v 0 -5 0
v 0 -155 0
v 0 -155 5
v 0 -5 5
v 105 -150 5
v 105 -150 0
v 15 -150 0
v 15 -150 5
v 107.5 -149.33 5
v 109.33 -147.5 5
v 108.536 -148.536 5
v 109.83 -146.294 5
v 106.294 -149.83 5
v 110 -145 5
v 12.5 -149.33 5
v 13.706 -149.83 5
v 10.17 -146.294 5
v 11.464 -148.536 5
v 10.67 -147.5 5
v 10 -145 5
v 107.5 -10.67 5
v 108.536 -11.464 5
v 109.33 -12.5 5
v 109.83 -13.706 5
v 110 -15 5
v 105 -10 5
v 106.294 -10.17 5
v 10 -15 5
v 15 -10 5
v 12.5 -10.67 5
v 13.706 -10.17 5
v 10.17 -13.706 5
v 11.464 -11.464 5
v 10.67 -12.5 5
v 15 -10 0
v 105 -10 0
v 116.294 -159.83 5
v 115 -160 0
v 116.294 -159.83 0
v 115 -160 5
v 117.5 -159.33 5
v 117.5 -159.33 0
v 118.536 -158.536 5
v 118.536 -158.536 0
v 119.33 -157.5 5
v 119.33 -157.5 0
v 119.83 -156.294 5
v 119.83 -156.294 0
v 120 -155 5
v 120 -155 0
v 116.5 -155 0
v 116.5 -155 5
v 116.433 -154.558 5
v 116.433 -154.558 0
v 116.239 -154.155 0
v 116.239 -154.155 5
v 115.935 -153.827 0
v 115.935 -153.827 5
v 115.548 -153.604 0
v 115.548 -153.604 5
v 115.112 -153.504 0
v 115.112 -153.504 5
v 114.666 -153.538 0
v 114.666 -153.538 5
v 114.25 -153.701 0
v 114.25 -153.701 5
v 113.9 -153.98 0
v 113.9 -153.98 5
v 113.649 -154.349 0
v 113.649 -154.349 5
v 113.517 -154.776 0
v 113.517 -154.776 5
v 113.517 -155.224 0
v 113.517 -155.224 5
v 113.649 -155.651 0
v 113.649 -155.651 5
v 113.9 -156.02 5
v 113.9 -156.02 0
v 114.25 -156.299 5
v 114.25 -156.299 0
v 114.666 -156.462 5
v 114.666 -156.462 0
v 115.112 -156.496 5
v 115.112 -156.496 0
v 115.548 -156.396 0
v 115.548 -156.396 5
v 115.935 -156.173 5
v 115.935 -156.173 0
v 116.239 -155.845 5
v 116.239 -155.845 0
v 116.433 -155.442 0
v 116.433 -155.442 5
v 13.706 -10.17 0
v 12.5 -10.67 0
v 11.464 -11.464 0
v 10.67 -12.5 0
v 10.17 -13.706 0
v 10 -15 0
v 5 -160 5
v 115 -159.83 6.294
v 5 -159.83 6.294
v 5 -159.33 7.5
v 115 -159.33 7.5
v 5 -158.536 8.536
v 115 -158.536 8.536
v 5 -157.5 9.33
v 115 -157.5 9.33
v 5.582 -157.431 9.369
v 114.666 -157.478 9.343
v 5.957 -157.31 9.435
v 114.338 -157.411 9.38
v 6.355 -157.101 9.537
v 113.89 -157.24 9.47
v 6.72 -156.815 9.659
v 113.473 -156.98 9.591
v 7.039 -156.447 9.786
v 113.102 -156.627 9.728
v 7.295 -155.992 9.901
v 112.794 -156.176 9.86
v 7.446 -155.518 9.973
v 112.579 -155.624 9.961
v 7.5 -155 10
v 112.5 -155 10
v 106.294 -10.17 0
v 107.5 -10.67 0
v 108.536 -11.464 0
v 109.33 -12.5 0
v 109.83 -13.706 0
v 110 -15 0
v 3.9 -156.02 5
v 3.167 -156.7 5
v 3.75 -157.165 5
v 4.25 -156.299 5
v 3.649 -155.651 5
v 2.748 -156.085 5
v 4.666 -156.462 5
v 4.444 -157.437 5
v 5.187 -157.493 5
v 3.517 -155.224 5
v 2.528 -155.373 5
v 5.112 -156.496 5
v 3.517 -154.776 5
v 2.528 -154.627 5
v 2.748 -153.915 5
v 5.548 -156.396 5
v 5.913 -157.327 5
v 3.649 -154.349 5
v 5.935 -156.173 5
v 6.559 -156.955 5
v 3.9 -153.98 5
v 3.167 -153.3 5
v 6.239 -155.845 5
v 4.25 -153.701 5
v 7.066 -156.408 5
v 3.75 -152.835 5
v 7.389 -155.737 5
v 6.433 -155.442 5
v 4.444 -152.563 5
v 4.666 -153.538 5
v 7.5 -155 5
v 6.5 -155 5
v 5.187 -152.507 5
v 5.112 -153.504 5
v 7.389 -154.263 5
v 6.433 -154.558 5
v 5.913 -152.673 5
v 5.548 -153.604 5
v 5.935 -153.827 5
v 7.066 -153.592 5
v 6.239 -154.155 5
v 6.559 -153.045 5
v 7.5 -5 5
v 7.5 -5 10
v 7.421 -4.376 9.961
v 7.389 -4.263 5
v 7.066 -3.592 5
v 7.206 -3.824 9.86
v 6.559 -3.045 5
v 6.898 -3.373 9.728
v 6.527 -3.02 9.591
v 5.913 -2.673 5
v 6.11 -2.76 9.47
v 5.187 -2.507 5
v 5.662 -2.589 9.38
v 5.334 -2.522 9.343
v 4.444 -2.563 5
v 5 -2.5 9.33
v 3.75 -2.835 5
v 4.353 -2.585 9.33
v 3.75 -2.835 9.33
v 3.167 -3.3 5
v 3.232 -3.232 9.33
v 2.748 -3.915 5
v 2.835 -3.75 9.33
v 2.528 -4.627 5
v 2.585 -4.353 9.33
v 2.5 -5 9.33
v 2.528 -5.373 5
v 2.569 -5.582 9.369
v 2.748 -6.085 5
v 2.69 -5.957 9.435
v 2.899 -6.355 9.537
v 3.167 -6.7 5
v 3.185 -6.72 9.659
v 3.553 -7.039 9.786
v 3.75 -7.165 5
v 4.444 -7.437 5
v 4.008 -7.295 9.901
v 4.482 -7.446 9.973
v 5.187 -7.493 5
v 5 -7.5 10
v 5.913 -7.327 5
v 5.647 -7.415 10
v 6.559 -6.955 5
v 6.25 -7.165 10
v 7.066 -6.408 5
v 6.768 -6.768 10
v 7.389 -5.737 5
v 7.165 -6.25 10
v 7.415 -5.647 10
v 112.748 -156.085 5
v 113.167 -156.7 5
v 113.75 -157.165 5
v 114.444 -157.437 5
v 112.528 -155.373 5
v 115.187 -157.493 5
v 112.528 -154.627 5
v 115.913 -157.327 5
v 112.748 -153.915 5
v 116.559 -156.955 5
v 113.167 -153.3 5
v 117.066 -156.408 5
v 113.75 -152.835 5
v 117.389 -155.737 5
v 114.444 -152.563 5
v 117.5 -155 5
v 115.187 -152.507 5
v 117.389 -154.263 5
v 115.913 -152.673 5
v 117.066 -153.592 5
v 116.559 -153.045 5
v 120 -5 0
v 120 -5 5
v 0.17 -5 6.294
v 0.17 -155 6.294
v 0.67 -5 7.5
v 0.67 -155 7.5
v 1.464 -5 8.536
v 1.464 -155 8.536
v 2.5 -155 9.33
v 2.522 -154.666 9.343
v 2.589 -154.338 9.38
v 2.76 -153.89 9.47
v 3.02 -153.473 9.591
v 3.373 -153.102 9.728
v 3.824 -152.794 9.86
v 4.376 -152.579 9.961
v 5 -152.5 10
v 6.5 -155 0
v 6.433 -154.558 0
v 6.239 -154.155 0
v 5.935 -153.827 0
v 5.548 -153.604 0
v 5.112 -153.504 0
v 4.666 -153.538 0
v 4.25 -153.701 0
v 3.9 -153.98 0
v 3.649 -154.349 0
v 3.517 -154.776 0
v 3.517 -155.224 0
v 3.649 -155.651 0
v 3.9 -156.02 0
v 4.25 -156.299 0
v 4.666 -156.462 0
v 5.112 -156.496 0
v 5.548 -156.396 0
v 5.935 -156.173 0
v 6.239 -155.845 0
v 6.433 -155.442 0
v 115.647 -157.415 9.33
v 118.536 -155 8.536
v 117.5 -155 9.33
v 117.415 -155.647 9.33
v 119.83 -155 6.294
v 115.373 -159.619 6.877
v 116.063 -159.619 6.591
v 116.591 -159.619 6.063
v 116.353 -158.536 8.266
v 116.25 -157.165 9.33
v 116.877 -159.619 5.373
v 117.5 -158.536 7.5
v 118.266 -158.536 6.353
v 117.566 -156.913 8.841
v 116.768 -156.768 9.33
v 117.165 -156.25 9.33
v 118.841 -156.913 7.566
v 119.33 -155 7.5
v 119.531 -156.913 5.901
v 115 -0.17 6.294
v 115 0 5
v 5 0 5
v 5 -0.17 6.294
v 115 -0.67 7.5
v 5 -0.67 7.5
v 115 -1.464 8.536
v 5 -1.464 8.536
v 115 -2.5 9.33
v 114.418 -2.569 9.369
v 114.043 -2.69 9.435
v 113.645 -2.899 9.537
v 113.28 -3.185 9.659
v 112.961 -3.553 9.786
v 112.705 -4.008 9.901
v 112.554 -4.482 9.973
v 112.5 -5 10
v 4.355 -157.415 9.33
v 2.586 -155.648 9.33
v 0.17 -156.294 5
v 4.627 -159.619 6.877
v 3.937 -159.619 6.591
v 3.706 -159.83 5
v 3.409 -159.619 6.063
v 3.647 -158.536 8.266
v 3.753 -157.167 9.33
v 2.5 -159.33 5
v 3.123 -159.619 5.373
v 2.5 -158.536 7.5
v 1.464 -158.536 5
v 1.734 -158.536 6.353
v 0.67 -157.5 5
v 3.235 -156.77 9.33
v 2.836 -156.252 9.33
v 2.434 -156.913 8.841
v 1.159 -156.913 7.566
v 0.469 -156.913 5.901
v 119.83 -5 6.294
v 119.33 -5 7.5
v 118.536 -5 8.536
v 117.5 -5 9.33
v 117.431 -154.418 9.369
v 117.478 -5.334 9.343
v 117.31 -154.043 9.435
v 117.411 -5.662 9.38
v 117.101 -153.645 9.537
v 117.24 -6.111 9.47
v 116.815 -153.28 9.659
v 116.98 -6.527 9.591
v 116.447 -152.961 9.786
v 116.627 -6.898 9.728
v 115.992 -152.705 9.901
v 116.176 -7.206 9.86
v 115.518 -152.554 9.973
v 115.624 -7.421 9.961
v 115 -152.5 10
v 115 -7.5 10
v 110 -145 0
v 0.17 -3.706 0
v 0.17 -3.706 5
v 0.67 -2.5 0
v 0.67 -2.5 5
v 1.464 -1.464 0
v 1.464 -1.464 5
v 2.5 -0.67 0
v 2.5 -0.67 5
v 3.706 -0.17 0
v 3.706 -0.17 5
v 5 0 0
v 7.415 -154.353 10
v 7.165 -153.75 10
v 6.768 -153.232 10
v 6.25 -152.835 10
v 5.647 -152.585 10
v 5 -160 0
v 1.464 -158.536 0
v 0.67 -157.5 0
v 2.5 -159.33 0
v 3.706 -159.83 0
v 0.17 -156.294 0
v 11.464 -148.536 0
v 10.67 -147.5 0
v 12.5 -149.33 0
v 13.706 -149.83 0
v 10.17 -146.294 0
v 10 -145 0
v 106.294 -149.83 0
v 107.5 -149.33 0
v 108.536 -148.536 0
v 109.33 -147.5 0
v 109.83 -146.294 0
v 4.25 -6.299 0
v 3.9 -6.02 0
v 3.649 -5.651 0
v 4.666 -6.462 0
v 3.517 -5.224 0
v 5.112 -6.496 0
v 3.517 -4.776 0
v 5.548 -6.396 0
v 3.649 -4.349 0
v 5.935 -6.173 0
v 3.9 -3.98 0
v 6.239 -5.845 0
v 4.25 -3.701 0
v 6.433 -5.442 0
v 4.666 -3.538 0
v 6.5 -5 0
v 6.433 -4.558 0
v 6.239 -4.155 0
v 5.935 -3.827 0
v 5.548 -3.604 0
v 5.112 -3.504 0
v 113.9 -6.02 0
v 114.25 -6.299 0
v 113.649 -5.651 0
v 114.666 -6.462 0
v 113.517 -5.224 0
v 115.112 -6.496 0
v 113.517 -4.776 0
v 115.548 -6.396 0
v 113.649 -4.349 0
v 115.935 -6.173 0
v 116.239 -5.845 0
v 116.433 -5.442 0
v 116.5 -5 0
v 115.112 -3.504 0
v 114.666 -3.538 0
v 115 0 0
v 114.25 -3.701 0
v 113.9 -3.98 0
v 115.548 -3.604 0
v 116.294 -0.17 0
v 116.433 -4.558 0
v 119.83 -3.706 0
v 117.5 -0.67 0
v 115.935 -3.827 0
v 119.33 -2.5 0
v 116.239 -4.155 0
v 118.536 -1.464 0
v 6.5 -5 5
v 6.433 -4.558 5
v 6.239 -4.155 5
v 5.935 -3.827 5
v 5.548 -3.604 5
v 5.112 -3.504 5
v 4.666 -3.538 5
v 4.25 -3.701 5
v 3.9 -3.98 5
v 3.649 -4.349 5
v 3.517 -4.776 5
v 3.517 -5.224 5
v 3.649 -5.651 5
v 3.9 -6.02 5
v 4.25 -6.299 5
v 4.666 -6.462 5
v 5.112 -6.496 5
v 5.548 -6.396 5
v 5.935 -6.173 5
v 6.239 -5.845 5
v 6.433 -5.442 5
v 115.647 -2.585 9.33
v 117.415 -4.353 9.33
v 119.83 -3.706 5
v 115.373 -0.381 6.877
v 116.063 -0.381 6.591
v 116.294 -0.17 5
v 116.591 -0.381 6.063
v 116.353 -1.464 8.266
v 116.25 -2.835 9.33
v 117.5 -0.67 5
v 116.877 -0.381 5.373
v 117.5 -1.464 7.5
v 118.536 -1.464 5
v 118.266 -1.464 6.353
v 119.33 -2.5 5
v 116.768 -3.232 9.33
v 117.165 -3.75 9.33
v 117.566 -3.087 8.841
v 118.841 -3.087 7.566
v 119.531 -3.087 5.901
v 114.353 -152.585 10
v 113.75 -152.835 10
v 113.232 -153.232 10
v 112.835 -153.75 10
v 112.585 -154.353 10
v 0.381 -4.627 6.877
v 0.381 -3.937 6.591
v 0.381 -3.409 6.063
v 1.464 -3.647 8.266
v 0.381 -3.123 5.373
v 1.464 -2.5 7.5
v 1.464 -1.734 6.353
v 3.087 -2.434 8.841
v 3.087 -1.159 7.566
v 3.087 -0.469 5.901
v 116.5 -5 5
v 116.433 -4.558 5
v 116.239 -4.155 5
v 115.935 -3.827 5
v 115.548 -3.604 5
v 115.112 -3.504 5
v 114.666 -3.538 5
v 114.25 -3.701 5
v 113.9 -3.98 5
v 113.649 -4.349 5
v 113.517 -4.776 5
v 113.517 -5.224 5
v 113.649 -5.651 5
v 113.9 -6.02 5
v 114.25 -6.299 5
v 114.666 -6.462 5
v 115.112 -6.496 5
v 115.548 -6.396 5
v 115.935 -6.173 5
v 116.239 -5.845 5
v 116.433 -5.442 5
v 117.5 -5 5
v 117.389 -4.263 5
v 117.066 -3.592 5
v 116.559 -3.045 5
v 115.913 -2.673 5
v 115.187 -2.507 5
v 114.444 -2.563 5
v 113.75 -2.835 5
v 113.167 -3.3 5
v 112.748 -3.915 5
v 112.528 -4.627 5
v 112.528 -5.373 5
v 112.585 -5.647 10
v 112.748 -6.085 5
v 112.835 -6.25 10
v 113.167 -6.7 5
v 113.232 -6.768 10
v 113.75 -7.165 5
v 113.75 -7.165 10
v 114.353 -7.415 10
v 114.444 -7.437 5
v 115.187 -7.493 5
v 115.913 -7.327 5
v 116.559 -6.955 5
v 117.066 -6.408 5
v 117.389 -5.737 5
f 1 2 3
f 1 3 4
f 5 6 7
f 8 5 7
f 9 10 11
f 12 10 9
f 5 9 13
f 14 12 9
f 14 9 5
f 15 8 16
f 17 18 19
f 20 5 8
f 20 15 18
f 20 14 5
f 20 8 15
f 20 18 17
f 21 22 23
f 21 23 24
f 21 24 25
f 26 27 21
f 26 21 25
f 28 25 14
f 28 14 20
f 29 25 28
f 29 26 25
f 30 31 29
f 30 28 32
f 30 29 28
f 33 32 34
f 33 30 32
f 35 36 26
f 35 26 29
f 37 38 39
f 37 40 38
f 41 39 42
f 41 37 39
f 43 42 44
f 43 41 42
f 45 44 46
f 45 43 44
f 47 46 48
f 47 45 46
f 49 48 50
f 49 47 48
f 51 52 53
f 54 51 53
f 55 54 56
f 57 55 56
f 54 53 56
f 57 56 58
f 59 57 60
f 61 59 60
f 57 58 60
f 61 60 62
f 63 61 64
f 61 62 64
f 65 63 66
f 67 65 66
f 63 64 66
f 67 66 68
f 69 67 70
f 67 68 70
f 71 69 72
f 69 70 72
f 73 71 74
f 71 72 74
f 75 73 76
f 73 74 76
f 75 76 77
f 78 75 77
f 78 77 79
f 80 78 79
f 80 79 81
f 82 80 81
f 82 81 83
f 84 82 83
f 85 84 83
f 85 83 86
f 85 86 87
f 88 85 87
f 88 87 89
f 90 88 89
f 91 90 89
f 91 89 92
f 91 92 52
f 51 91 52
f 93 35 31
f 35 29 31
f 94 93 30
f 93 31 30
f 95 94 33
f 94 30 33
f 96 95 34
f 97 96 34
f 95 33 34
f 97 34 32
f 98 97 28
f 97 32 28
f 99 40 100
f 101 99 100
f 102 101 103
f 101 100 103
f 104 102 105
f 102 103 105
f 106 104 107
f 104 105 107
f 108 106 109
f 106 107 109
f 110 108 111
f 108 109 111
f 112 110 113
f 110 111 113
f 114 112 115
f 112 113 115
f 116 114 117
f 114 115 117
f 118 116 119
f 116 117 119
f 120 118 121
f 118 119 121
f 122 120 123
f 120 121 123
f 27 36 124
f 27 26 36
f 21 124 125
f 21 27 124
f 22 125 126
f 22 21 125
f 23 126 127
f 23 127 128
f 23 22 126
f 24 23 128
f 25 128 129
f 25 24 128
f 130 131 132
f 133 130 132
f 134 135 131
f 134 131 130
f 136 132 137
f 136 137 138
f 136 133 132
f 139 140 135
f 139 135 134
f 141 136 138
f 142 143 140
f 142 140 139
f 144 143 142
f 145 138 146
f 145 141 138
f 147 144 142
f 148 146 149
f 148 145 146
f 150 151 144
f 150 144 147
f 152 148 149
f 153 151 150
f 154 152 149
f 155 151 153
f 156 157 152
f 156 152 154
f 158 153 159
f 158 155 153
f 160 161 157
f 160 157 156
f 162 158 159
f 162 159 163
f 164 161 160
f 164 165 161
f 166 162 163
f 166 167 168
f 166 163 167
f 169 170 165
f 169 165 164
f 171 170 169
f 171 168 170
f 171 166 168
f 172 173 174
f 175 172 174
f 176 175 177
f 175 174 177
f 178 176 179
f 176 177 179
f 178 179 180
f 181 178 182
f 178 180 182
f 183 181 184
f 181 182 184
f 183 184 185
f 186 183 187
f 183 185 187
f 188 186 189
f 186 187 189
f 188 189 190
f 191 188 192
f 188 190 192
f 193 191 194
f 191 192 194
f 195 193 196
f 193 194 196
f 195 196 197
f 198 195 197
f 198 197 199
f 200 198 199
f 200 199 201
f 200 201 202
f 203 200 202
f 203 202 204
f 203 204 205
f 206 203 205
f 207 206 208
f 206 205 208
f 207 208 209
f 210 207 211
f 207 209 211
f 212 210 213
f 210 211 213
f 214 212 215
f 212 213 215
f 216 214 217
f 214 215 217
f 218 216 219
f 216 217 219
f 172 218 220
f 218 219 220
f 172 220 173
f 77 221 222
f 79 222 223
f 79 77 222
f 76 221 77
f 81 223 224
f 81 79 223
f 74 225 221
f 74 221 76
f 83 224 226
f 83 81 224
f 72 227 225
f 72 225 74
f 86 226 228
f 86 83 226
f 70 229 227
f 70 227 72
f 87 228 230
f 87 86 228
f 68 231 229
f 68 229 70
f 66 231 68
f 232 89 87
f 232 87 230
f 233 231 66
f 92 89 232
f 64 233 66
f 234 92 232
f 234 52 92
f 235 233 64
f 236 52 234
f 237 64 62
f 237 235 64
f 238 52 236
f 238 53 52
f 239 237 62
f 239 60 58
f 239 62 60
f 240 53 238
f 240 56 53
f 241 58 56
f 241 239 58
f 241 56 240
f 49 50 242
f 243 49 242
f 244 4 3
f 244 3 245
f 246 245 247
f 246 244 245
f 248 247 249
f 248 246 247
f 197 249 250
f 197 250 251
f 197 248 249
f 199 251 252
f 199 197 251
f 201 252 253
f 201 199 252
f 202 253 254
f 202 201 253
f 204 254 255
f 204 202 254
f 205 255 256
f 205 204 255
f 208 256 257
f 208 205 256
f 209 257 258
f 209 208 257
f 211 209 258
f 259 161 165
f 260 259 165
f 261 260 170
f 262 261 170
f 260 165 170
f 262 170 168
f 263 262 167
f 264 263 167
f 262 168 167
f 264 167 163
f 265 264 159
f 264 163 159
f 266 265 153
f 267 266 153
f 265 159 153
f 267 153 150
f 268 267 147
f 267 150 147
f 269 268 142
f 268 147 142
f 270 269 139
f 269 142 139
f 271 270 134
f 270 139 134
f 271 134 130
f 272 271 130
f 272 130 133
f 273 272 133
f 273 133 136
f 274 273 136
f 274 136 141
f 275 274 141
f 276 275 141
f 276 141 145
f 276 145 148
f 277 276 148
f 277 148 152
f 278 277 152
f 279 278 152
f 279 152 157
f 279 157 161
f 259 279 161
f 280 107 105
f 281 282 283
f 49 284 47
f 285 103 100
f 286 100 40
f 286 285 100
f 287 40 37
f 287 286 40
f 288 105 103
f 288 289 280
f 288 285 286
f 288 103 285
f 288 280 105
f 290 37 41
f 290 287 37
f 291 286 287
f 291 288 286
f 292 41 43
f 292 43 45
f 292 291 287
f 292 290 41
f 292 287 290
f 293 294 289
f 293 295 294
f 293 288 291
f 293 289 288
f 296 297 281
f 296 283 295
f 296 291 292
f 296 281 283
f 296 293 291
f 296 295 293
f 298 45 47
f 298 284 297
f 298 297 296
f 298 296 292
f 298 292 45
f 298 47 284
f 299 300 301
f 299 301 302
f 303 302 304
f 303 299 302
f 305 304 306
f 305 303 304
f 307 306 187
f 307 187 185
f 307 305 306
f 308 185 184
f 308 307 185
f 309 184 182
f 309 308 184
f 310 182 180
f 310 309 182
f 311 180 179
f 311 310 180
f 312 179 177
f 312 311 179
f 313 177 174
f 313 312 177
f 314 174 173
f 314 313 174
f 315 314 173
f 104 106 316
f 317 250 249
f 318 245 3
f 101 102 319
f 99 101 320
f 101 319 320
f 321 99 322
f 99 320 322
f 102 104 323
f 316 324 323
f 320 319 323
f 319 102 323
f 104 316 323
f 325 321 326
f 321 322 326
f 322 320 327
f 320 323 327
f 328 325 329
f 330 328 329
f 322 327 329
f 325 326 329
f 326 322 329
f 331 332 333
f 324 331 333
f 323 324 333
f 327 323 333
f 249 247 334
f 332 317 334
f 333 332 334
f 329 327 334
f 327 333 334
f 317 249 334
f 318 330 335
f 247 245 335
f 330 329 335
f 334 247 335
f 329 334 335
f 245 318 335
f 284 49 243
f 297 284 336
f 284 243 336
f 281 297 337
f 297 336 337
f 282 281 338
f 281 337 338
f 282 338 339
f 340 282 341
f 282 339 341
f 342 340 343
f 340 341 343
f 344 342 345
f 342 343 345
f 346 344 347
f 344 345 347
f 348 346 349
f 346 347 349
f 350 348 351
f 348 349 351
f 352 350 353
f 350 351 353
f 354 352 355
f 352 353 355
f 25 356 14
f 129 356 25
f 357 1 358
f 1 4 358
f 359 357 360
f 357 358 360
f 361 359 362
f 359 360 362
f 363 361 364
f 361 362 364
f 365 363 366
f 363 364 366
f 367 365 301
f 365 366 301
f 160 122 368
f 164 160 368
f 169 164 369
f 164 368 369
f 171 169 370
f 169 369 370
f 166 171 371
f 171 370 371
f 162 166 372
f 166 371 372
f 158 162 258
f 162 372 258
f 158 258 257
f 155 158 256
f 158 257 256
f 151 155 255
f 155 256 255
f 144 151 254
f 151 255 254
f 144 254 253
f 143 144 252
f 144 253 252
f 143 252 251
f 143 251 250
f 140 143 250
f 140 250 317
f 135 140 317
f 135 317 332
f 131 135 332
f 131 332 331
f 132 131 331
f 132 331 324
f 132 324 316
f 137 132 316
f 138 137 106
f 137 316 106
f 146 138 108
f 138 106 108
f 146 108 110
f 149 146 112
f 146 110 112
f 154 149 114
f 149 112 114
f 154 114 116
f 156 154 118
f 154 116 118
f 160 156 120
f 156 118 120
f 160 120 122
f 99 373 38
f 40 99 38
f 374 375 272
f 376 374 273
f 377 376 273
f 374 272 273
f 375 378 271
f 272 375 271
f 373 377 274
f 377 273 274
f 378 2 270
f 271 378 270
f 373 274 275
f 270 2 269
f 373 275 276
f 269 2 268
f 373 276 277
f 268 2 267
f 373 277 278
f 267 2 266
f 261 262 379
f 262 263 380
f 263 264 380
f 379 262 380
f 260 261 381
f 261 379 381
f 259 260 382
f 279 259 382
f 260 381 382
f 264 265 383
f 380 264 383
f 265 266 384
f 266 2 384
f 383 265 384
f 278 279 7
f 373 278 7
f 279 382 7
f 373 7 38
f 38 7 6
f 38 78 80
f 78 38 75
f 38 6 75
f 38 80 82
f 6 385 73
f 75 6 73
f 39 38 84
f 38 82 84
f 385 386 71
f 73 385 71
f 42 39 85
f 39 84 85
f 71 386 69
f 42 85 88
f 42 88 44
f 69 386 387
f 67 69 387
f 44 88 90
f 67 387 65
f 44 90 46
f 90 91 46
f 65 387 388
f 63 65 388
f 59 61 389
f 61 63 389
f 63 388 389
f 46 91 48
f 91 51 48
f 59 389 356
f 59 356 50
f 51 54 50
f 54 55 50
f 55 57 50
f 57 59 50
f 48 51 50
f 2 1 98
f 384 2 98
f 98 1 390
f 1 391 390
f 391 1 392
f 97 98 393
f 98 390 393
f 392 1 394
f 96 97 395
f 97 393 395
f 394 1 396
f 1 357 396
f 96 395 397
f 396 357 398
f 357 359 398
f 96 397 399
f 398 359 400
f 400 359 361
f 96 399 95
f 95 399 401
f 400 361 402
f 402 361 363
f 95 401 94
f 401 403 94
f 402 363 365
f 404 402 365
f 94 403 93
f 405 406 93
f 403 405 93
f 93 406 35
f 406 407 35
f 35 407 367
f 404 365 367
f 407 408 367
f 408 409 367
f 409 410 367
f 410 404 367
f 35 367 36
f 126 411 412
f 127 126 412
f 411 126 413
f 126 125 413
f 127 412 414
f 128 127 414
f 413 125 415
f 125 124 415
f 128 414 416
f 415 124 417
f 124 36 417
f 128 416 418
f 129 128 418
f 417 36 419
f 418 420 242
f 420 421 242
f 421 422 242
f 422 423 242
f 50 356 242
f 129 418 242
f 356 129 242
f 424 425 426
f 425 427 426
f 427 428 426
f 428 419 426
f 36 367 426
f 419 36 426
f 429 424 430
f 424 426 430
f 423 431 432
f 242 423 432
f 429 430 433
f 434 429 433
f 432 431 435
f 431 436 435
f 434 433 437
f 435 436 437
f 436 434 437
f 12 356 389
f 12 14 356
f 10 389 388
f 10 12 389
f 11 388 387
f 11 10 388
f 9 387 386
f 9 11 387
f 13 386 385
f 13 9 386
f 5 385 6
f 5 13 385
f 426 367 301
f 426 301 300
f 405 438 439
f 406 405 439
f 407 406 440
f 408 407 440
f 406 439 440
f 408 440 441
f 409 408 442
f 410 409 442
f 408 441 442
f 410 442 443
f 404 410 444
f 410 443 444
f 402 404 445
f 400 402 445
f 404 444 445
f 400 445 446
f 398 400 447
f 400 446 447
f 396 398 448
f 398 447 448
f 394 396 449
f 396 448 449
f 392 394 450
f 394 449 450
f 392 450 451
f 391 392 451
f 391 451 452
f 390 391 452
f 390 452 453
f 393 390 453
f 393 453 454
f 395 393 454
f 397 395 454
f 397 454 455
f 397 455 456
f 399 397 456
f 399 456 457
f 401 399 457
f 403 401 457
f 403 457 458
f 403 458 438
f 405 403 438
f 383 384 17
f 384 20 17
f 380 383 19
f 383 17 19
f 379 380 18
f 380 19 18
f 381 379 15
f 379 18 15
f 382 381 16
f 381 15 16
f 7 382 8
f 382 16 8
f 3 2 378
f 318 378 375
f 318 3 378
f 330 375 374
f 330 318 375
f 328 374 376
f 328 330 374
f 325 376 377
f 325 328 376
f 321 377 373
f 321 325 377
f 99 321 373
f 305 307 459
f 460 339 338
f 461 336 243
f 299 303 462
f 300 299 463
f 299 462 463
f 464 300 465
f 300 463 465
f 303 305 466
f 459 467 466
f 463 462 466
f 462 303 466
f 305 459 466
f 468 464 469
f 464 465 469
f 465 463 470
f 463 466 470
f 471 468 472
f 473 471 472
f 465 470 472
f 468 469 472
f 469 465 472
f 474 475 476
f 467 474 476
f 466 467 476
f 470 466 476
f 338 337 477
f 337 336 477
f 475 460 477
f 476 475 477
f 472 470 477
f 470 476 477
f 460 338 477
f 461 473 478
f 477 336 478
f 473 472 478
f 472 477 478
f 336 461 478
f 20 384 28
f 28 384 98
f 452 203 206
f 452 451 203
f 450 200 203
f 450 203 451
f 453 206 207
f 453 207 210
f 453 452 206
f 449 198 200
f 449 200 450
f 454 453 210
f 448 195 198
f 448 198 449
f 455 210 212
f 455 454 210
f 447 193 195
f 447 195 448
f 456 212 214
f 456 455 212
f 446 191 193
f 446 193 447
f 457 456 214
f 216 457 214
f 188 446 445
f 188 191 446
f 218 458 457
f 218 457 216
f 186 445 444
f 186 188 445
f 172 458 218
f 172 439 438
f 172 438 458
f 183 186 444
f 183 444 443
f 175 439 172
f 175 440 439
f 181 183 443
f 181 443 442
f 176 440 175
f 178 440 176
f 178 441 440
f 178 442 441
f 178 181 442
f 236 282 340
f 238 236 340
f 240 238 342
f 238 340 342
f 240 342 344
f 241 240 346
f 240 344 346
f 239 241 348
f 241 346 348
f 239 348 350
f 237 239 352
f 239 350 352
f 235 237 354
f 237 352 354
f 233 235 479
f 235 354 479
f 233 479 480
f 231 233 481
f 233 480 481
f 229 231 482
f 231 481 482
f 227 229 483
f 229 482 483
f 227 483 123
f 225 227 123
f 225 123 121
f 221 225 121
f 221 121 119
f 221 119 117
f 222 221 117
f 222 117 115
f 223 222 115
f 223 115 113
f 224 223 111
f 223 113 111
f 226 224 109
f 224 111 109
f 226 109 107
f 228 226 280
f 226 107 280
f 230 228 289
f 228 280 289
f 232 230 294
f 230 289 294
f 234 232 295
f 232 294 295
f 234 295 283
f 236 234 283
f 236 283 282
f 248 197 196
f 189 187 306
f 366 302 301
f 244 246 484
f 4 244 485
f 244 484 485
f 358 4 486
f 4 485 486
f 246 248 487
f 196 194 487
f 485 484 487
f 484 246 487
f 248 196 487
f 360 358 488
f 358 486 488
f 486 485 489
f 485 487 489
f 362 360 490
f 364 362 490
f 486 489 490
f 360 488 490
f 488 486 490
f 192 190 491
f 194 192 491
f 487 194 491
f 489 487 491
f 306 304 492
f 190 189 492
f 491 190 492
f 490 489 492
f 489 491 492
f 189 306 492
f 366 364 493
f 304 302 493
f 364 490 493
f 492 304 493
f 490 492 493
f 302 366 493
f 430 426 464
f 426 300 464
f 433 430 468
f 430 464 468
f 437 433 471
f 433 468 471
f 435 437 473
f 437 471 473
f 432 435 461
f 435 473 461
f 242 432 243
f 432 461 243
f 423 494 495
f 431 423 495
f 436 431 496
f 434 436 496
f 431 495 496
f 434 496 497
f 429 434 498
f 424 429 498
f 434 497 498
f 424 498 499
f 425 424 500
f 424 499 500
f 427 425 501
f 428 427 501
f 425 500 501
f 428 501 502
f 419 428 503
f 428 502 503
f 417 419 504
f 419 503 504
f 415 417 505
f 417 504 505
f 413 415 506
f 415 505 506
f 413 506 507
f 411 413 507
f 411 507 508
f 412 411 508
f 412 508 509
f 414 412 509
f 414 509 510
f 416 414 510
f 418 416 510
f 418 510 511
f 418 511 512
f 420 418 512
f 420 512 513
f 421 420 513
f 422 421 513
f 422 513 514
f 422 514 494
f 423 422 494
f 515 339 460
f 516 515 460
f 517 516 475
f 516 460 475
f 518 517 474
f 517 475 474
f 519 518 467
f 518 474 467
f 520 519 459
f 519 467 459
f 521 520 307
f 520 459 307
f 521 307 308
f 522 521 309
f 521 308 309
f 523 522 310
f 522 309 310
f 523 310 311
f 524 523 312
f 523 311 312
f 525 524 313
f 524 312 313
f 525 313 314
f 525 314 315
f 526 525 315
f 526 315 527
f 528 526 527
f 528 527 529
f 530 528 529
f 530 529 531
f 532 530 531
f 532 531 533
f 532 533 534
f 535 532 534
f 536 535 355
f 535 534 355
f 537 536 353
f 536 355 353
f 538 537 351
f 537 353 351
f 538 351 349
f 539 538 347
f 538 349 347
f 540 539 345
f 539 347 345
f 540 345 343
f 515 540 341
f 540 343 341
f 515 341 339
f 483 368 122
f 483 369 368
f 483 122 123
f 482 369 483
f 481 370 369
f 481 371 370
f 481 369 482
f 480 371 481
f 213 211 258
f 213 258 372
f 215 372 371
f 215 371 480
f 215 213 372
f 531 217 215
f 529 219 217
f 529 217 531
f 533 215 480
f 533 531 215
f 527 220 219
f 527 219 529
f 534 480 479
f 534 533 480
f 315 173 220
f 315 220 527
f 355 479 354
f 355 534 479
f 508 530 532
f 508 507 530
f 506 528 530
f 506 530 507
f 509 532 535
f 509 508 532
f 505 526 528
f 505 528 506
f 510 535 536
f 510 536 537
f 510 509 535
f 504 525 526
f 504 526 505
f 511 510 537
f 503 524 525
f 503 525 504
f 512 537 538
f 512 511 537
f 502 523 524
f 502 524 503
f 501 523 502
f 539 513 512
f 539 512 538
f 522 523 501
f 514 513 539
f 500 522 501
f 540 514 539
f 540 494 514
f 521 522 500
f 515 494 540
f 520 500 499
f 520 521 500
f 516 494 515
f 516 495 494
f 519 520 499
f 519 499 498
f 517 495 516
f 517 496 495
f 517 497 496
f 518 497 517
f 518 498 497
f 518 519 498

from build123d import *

# Parameters (mm, degrees)
SKETCH1_W           = 120
SKETCH1_H           = 160
BOSS_EXTRUDE1_DEPTH = 10
SKETCH2_W           = 100
SKETCH2_H           = 140
CUT_EXTRUDE1_DEPTH  = 5
FILLET1_R           = 5
FILLET2_R           = 5
FILLET3_R           = 5
SKETCH3_R           = 2.5
CUT_EXTRUDE2_DEPTH  = 5
SKETCH4_R           = 2.5
CUT_EXTRUDE3_DEPTH  = 5
SKETCH5_R           = 2.5
CUT_EXTRUDE4_DEPTH  = 5
SKETCH6_R           = 1.5
CUT_EXTRUDE5_DEPTH  = 10


with BuildPart() as part:
    # Sketch1 → Boss-Extrude1 (new body)
    with BuildSketch(Plane.XY):
        with Locations((60, -80)):
            Rectangle(SKETCH1_W, SKETCH1_H)
    extrude(amount=BOSS_EXTRUDE1_DEPTH)

    # Sketch2 → Cut-Extrude1 (cut)
    with BuildSketch(Plane(origin=(0, 0, 0), x_dir=(-1, 0, 0), z_dir=(0, 0, -1))):
        with Locations((-60, -80)):
            Rectangle(SKETCH2_W, SKETCH2_H)
    extrude(amount=-CUT_EXTRUDE1_DEPTH, mode=Mode.SUBTRACT)

    # Fillet1
    fillet1_edges = [part.edges().sort_by_distance(p)[0] for p in [
        (10, -10, 2.5),
    ]]
    fillet(fillet1_edges, radius=FILLET1_R)

    # Fillet2
    fillet2_edges = [part.edges().sort_by_distance(p)[0] for p in [
        (110, -150, 2.5),
        (110, -10, 2.5),
        (10, -150, 2.5),
    ]]
    fillet(fillet2_edges, radius=FILLET2_R)

    # Fillet3
    fillet3_edges = [part.edges().sort_by_distance(p)[0] for p in [
        (120, -80, 10),
        (60, 0, 10),
        (0, -80, 10),
        (60, -160, 10),
        (0, 0, 5),
        (120, 0, 5),
        (120, -160, 5),
        (0, -160, 5),
    ]]
    fillet(fillet3_edges, radius=FILLET3_R)

    # Sketch3 → Cut-Extrude2 (cut)
    with BuildSketch(Plane.XY.offset(10)):
        with Locations((115, -5)):
            Circle(SKETCH3_R)
    extrude(amount=-CUT_EXTRUDE2_DEPTH, mode=Mode.SUBTRACT)

    # Sketch4 → Cut-Extrude3 (cut)
    with BuildSketch(Plane.XY.offset(10)):
        with Locations((5, -5)):
            Circle(SKETCH4_R)
    extrude(amount=-CUT_EXTRUDE3_DEPTH, mode=Mode.SUBTRACT)

    # Sketch5 → Cut-Extrude4 (cut)
    with BuildSketch(Plane.XY.offset(10)):
        with Locations((5, -155)):
            Circle(SKETCH5_R)
        with Locations((115, -155)):
            Circle(SKETCH5_R)
    extrude(amount=-CUT_EXTRUDE4_DEPTH, mode=Mode.SUBTRACT)

    # Sketch6 → Cut-Extrude5 (cut)
    with BuildSketch(Plane.XY.offset(5)):
        with Locations((5, -5)):
            Circle(SKETCH6_R)
        with Locations((115, -5)):
            Circle(SKETCH6_R)
        with Locations((115, -155)):
            Circle(SKETCH6_R)
        with Locations((5, -155)):
            Circle(SKETCH6_R)
    extrude(amount=-CUT_EXTRUDE5_DEPTH, mode=Mode.SUBTRACT)


solid = part.part
